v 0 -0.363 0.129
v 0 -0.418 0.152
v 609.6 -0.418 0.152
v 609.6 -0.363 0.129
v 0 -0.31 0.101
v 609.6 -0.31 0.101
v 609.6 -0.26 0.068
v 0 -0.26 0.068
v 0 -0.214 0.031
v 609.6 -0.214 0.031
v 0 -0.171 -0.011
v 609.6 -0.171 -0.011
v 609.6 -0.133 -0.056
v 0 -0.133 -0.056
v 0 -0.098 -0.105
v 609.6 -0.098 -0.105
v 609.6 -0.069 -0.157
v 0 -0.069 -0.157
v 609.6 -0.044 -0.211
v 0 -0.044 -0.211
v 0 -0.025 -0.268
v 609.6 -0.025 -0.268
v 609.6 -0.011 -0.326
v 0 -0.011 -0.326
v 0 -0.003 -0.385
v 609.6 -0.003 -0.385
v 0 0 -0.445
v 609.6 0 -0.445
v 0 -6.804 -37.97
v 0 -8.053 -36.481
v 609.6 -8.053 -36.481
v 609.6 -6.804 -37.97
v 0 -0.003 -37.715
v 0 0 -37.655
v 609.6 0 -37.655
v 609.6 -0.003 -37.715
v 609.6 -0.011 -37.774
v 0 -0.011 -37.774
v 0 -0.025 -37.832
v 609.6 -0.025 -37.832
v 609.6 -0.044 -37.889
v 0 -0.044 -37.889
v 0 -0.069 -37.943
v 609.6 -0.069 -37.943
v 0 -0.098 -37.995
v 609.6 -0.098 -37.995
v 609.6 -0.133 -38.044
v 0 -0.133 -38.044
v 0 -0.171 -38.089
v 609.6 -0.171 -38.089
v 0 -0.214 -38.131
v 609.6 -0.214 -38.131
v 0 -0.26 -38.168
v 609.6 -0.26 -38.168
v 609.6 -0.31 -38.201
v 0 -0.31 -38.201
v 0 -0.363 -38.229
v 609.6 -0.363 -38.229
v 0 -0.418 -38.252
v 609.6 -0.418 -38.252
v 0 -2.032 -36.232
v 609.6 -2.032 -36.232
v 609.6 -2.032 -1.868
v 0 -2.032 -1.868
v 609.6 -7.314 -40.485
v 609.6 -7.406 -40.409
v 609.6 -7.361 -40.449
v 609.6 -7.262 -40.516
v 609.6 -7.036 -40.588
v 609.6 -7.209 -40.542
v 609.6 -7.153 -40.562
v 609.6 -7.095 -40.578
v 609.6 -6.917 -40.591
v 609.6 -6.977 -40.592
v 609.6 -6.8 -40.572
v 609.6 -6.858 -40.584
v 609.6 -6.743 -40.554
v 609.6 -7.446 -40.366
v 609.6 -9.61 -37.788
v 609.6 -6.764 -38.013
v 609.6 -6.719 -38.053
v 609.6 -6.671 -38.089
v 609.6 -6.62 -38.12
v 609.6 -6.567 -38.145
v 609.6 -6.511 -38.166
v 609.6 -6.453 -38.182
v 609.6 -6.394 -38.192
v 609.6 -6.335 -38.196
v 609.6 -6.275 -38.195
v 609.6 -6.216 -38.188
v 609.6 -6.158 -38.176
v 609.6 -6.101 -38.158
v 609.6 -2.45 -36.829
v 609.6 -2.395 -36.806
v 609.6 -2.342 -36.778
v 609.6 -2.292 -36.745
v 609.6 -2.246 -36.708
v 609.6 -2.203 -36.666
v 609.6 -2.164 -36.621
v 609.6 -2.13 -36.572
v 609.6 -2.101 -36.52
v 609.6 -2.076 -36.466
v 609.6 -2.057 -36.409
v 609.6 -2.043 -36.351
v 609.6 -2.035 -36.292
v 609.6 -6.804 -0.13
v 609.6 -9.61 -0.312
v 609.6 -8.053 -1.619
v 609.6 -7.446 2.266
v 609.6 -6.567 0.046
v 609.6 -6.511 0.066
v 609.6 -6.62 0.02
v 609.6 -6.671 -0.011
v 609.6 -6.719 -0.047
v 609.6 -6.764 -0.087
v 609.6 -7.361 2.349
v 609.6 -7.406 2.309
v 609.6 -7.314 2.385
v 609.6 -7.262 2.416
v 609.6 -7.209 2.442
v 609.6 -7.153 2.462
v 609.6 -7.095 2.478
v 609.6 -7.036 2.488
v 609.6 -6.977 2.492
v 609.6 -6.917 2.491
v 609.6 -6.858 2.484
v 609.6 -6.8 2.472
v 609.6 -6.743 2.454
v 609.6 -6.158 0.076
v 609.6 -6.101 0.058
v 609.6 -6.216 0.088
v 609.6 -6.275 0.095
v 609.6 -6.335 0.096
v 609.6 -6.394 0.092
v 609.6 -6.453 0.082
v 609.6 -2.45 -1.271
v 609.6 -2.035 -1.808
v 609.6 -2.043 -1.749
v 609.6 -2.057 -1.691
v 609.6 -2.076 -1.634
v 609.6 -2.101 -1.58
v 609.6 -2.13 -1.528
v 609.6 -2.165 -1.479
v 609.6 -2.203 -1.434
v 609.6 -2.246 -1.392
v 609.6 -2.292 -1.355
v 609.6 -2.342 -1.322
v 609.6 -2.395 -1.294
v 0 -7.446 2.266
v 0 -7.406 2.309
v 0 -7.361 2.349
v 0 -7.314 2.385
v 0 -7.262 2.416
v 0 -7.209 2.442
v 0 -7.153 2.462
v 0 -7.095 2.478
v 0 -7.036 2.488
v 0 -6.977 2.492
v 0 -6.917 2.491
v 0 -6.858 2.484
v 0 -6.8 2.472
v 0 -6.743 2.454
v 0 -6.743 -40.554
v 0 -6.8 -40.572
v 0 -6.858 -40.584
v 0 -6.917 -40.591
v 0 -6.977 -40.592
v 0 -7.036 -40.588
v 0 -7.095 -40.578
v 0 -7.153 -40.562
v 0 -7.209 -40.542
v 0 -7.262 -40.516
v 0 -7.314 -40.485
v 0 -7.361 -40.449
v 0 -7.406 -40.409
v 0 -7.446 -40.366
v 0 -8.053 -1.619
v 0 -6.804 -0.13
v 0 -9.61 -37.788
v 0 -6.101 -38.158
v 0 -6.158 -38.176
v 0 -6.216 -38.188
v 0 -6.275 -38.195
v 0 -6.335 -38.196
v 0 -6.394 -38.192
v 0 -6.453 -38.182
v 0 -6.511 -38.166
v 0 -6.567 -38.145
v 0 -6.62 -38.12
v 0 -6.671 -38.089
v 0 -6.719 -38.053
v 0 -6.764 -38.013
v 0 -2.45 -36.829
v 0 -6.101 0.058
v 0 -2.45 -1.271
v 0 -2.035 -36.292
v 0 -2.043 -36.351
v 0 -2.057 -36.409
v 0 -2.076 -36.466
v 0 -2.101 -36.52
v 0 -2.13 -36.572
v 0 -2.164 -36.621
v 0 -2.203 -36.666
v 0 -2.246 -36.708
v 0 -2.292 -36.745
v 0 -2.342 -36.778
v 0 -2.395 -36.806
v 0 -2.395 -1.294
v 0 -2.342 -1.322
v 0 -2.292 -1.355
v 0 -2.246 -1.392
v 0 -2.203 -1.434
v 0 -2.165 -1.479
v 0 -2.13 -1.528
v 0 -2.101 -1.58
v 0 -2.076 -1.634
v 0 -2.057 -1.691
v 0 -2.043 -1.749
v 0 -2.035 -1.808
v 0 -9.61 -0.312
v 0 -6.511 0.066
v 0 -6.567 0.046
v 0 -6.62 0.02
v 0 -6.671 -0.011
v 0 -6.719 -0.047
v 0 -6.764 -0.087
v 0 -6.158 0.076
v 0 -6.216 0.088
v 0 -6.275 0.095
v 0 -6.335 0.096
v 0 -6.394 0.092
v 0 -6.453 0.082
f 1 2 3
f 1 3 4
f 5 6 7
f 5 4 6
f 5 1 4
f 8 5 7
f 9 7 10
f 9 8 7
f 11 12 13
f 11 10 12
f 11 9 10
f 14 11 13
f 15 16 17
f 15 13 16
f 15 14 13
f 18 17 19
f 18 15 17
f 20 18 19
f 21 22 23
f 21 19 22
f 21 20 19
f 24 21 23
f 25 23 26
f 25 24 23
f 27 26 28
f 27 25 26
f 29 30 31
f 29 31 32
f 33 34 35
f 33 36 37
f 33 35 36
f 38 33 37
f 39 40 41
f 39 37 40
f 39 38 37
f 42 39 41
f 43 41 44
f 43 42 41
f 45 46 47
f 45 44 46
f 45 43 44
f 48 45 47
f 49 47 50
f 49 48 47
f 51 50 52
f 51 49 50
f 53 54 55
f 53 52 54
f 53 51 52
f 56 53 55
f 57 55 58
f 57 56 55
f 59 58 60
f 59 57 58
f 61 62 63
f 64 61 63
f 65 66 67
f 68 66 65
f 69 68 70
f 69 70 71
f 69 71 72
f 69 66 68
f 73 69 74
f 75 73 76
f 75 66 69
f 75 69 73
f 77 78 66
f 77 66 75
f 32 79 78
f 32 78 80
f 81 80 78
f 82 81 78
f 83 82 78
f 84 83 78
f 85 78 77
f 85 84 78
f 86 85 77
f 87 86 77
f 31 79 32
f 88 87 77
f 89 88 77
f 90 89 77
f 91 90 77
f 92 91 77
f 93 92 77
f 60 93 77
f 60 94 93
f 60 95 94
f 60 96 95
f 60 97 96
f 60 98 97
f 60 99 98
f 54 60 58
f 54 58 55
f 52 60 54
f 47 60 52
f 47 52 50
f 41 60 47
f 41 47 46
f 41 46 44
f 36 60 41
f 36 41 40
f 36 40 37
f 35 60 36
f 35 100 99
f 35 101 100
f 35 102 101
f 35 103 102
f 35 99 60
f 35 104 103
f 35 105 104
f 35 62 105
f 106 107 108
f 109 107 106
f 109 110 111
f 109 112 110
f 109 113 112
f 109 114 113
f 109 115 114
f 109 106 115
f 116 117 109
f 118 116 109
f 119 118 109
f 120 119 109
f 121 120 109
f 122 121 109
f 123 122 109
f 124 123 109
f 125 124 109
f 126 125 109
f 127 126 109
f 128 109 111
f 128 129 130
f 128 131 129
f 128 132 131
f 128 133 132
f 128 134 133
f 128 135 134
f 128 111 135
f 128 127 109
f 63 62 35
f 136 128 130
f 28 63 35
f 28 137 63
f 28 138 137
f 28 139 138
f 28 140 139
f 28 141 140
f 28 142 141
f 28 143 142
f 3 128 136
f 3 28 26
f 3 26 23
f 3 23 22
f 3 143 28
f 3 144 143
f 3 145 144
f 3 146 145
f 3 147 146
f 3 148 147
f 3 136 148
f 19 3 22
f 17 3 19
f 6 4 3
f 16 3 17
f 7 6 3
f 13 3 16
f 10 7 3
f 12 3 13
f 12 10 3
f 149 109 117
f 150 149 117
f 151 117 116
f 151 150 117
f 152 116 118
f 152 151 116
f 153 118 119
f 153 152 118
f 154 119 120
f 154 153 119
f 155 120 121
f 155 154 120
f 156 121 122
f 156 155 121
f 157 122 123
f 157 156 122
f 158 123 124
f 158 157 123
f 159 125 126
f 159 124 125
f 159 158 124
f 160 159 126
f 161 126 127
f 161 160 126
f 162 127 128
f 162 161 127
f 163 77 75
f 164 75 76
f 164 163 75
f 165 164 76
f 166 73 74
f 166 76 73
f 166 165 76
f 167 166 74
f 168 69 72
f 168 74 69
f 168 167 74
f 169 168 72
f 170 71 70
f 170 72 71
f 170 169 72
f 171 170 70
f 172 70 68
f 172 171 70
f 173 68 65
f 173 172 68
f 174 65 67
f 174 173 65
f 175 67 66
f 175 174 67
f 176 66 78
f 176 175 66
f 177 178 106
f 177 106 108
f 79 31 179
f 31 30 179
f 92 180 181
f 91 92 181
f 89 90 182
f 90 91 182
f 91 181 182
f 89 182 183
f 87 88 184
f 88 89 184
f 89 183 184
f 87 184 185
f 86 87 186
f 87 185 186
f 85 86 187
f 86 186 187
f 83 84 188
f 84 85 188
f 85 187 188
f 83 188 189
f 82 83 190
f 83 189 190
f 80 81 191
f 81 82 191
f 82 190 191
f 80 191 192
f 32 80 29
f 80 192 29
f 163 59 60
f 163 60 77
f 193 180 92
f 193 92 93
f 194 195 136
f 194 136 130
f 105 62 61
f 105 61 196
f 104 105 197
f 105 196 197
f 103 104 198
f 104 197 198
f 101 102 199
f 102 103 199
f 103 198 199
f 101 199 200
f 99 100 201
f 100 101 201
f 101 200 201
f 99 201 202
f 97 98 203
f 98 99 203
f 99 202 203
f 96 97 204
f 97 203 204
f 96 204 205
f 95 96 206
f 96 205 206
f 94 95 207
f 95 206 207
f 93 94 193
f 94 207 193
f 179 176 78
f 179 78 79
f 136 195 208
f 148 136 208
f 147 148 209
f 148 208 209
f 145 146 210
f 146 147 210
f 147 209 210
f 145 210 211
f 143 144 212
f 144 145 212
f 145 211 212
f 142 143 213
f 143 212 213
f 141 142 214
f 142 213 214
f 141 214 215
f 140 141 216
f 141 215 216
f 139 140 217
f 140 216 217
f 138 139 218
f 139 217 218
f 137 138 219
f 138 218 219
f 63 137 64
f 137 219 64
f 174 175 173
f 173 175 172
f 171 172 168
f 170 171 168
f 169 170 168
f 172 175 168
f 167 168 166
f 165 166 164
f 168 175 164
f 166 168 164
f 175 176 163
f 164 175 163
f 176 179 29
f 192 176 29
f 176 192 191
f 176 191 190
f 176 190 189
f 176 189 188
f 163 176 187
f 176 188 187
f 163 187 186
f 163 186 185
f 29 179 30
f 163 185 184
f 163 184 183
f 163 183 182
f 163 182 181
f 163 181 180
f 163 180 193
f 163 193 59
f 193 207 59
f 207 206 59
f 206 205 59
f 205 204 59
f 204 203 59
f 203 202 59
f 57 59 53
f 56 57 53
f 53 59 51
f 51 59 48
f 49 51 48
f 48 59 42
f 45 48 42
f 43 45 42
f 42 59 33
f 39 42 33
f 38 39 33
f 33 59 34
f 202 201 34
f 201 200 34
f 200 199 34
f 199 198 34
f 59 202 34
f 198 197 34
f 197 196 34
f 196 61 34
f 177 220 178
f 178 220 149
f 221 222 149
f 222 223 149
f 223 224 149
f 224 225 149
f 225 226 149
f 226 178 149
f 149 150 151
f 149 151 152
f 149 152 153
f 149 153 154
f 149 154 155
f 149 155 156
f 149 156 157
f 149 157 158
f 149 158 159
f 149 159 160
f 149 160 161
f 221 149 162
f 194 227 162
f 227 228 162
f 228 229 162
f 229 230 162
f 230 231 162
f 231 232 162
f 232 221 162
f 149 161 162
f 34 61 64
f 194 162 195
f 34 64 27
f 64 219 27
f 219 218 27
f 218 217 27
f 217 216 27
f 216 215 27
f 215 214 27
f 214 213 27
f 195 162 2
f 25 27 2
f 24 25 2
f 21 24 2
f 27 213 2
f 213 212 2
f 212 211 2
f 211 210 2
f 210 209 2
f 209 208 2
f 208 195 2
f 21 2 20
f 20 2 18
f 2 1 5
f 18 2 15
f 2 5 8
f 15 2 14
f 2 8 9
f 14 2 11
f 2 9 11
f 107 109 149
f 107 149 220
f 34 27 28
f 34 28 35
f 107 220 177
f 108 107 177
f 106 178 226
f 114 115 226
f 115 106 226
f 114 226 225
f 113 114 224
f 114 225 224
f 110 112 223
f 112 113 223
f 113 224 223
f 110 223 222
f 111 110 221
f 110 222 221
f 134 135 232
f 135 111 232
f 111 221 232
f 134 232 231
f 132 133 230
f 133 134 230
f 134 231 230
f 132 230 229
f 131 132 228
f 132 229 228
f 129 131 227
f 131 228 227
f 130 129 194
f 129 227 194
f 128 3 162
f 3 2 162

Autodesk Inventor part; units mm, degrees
ref_plane "YZ Plane" through (0, 0, 0) normal (1, 0, 0) x (0, 1, 0)
ref_plane "XZ Plane" through (0, 0, 0) normal (0, 1, 0) x (-1, 0, 0)
ref_plane "XY Plane" through (0, 0, 0) normal (0, 0, 1) x (1, 0, 0)
sketch "Sketch1" plane through (0, 0, 0) normal (1, 0, 0) x (0, 1, 0)
  line L0 (0, -0.4446) -> (0, -37.6554)
  line L1 (-0.4178, 0.1521) -> (-6.7426, 2.4541)
  line L2 (-7.4463, 2.2656) -> (-9.6095, -0.3124)
  line L3 (-0.4178, -38.2521) -> (-6.7426, -40.5541)
  line L4 (-7.4463, -40.3656) -> (-9.6095, -37.7876)
  line L5 (-8.0529, -36.4814) -> (-6.8042, -37.9695)
  line L6 (-6.1006, -38.158) -> (-2.4498, -36.8293)
  line L7 (-2.032, -36.2325) -> (-2.032, -1.8675)
  line L8 (-2.4498, -1.2707) -> (-6.1006, 0.058)
  line L9 (-6.8042, -0.1305) -> (-8.0529, -1.6186)
  line L10 (-9.6095, -0.3124) -> (-8.0529, -1.6186)
  line L11 (-8.0529, -36.4814) -> (-9.6095, -37.7876)
  arc A0 (0, -0.4446) -> (-0.4178, 0.1521) centre (-0.635, -0.4446) ccw
  arc A1 (-2.032, -1.8675) -> (-2.4498, -1.2707) centre (-2.667, -1.8675) ccw
  arc A2 (-6.1006, 0.058) -> (-6.8042, -0.1305) centre (-6.3178, -0.5387) ccw
  arc A3 (-6.7426, 2.4541) -> (-7.4463, 2.2656) centre (-6.9598, 1.8574) ccw
  arc A4 (-0.4178, -38.2521) -> (0, -37.6554) centre (-0.635, -37.6554) ccw
  arc A5 (-2.4498, -36.8293) -> (-2.032, -36.2325) centre (-2.667, -36.2325) ccw
  arc A6 (-6.8042, -37.9695) -> (-6.1006, -38.158) centre (-6.3178, -37.5613) ccw
  arc A7 (-7.4463, -40.3656) -> (-6.7426, -40.5541) centre (-6.9598, -39.9574) ccw
  point P0 (0, 0)
  point P1 (0, -38.1)
  point P2 (-7.1605, 2.6062)
  point P3 (-7.1605, -40.7062)
  point P4 (-6.5184, -38.3101)
  point P5 (-6.5184, 0.2101)
  dimension "d7" = 7.62
  dimension "d8" = 3.81
  dimension "d9" = 110
  dimension "d10" = 110
  dimension "d11" = 7.62
  dimension "d12" = 3.81
  dimension "d13" = 110
  dimension "d14" = 110
  dimension "d15" = 38.1
  dimension "d16" = 2.032
  dimension "d17" = 2.3872
  dimension "d18" = 2.3872
  dimension "d19" = 0.635
extrude "Extrusion1" add sketch "Sketch1" along normal blind 609.6
properties part number "the inside for the 2nd slider part"
